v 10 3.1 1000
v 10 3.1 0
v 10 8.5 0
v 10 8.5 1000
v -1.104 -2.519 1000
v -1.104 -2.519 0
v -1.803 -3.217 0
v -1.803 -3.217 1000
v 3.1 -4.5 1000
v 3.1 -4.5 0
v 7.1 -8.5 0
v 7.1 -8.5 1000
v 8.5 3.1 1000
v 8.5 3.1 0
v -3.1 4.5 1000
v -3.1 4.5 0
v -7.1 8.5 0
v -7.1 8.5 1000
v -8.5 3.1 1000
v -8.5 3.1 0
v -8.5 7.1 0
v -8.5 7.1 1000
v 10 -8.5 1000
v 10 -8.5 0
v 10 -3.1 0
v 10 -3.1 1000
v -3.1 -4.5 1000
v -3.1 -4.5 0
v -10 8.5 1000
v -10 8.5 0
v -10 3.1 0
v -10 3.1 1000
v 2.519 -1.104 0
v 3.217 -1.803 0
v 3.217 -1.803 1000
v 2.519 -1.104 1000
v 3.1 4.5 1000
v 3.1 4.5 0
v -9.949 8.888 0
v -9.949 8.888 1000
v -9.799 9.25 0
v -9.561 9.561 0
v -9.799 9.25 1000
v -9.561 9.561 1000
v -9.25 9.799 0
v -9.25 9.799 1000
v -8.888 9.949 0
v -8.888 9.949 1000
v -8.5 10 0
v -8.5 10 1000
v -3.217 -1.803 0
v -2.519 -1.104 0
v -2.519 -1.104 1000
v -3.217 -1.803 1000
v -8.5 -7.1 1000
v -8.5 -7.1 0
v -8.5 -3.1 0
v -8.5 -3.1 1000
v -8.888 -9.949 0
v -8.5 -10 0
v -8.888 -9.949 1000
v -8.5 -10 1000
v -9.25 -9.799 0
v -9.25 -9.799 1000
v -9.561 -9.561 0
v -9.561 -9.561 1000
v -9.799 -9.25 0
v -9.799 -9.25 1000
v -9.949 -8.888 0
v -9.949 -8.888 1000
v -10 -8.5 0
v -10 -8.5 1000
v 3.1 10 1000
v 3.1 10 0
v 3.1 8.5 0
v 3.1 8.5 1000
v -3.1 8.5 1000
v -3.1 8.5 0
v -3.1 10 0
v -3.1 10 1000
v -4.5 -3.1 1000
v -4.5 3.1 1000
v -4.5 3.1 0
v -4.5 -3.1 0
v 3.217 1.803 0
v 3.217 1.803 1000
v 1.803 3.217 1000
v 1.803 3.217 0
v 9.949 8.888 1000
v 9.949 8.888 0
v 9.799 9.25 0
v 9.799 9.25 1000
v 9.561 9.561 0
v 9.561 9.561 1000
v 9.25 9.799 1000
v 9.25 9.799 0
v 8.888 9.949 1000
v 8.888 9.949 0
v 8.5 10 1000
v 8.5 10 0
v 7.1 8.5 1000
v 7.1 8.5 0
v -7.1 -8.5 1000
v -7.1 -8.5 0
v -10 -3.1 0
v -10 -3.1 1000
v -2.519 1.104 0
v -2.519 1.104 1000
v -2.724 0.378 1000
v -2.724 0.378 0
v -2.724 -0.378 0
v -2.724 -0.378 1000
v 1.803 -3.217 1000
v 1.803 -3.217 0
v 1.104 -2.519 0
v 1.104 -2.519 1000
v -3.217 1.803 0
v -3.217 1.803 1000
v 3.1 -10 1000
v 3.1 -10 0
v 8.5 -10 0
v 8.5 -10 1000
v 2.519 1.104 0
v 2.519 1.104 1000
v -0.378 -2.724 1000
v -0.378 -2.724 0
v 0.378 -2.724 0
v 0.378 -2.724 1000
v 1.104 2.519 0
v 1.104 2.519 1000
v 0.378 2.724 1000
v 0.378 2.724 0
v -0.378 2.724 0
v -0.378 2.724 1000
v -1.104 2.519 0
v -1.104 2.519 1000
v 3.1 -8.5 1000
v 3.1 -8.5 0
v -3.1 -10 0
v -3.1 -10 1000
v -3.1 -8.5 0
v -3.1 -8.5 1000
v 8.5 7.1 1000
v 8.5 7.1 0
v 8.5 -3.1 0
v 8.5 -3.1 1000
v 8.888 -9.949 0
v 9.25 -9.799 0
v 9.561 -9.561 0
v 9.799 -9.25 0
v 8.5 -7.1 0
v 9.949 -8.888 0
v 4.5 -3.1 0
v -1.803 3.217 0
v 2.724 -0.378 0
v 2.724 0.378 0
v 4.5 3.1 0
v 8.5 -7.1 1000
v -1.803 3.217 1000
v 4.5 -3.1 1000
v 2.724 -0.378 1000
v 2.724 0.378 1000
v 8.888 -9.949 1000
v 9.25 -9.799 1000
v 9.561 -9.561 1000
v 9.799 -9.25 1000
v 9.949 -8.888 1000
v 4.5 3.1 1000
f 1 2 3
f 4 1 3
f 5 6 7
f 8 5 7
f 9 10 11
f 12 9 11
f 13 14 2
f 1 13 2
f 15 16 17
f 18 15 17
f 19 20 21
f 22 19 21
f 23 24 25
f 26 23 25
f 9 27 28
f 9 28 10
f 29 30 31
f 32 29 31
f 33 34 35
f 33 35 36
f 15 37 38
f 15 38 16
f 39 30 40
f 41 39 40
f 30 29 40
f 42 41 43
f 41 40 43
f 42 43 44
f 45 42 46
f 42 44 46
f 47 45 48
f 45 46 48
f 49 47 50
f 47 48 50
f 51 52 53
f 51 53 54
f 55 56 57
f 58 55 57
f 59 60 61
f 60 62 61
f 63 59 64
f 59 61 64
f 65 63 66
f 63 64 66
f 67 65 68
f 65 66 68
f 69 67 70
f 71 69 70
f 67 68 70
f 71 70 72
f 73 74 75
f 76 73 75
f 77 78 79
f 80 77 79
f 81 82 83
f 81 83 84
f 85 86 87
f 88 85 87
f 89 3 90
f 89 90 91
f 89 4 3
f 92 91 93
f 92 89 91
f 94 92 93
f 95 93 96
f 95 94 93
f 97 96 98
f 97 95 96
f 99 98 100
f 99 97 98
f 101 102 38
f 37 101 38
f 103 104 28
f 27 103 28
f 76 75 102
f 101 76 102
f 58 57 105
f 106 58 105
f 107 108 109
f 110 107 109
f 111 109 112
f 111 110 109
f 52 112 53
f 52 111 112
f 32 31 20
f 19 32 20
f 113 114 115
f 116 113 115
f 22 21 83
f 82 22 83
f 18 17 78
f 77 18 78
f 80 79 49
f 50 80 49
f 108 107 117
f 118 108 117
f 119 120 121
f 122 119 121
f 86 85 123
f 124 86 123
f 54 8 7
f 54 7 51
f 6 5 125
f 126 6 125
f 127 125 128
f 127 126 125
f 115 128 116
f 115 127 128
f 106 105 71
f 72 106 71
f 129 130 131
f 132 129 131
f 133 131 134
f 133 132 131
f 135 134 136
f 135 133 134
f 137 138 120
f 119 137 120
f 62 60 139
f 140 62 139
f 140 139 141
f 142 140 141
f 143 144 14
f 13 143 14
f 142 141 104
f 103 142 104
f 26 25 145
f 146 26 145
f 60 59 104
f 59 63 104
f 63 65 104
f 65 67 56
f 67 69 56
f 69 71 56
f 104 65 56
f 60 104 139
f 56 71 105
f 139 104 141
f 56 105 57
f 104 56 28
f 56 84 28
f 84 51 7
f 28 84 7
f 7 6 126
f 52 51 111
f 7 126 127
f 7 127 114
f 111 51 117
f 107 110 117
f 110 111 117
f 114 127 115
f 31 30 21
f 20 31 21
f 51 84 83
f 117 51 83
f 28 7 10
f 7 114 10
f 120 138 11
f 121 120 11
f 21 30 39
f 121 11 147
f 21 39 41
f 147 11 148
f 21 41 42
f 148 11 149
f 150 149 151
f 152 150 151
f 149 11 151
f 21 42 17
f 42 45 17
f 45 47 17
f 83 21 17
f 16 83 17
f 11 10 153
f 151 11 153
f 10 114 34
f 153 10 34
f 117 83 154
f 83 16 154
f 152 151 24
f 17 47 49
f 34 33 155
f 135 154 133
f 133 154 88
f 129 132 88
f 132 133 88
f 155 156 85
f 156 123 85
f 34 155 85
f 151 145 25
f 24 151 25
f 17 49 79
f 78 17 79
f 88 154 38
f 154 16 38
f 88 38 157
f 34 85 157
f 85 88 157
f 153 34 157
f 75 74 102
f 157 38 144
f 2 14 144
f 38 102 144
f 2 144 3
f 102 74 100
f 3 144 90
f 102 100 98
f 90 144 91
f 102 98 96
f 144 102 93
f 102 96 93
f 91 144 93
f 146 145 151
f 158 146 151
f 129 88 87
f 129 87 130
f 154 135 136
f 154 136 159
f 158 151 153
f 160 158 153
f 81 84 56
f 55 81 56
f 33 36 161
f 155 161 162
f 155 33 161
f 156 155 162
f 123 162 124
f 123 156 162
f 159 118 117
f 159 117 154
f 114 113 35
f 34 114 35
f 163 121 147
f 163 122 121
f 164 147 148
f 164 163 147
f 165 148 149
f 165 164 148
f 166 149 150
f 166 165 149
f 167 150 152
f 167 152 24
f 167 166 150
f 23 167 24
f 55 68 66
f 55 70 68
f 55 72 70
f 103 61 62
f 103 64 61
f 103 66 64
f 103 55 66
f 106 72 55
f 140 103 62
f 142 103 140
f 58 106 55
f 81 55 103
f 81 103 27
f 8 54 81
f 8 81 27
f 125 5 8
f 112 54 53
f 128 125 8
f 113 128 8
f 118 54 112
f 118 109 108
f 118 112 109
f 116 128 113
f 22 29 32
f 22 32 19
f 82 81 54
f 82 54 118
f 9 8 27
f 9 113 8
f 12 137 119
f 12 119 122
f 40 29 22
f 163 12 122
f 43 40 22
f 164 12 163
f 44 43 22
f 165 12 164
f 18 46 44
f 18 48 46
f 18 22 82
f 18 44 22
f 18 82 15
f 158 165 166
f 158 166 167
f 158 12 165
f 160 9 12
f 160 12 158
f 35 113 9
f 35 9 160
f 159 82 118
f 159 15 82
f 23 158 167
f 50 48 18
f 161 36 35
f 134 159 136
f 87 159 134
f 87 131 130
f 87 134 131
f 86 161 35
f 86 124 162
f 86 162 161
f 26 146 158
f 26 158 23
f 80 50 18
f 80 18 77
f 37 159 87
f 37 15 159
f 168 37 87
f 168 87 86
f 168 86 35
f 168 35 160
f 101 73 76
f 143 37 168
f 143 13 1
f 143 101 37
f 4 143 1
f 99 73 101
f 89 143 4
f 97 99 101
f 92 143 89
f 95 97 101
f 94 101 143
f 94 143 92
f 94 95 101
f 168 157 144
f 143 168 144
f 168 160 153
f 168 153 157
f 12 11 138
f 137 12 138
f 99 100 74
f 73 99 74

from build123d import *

# Parameters (mm, degrees)
CYLINDER_R             = 2.75
CYLINDER_DEPTH         = 1000
BOX_W                  = 2
BOX_H                  = 7.1
BOX_DEPTH              = 1000
BOX001_W               = 2
BOX001_H               = 7.1
BOX001_DEPTH           = 1000
FUSION_PLACEMENT_ANGLE = 45
PAD_DEPTH              = 1000
FILLET_R               = 1.5


with BuildPart() as cylinder:
    # Cylinder → Cylinder (new body)
    with BuildSketch(Plane.XY):
        Circle(CYLINDER_R)
    extrude(amount=CYLINDER_DEPTH)


with BuildPart() as cube:
    # Box → Box (new body)
    with BuildSketch(Plane(origin=(-1, -3.55, 0), x_dir=(1, 0, 0), z_dir=(0, 0, 1))):
        with Locations((1, 3.55)):
            Rectangle(BOX_W, BOX_H)
    extrude(amount=BOX_DEPTH)


with BuildPart() as fusion001:
    # Box001 → Box001 (new body)
    with BuildSketch(Plane(origin=(3.55, -1, 0), x_dir=(0, 1, 0), z_dir=(0, 0, 1))):
        with Locations((1, 3.55)):
            Rectangle(BOX001_W, BOX001_H)
    extrude(amount=BOX001_DEPTH)

    # Fusion: union Cube
    add(cube.part)


with BuildPart() as fusion001_1:
    # Fusion placement: moved
    add(fusion001.part.rotate(Axis((0, 0, 0), (0, 0, 1)), FUSION_PLACEMENT_ANGLE))

    # Fusion001: union Cylinder
    add(cylinder.part)


with BuildPart() as typeb_20x20_4open:
    # Sketch → Pad (new body)
    with BuildSketch(Plane.XY):
        Polygon((-10, -10), (-3.1, -10), (-3.1, -8.5), (-7.1, -8.5), (-3.1, -4.5), (3.1, -4.5), (7.1, -8.5), (3.1, -8.5), (3.1, -10), (10, -10), (10, -3.1), (8.5, -3.1), (8.5, -7.1), (4.5, -3.1), (4.5, 3.1), (8.5, 7.1), (8.5, 3.1), (10, 3.1), (10, 10), (3.1, 10), (3.1, 8.5), (7.1, 8.5), (3.1, 4.5), (-3.1, 4.5), (-7.1, 8.5), (-3.1, 8.5), (-3.1, 10), (-10, 10), (-10, 3.1), (-8.5, 3.1), (-8.5, 7.1), (-4.5, 3.1), (-4.5, -3.1), (-8.5, -7.1), (-8.5, -3.1), (-10, -3.1), align=None)
    extrude(amount=PAD_DEPTH)

    # Cut: cut Fusion001
    add(fusion001_1.part, mode=Mode.SUBTRACT)

    # Fillet
    fillet_edges = [typeb_20x20_4open.edges().sort_by_distance(p)[0] for p in [
        (10, -10, 500),
        (-10, -10, 500),
        (10, 10, 500),
        (-10, 10, 500),
    ]]
    fillet(fillet_edges, radius=FILLET_R)


solid = typeb_20x20_4open.part
